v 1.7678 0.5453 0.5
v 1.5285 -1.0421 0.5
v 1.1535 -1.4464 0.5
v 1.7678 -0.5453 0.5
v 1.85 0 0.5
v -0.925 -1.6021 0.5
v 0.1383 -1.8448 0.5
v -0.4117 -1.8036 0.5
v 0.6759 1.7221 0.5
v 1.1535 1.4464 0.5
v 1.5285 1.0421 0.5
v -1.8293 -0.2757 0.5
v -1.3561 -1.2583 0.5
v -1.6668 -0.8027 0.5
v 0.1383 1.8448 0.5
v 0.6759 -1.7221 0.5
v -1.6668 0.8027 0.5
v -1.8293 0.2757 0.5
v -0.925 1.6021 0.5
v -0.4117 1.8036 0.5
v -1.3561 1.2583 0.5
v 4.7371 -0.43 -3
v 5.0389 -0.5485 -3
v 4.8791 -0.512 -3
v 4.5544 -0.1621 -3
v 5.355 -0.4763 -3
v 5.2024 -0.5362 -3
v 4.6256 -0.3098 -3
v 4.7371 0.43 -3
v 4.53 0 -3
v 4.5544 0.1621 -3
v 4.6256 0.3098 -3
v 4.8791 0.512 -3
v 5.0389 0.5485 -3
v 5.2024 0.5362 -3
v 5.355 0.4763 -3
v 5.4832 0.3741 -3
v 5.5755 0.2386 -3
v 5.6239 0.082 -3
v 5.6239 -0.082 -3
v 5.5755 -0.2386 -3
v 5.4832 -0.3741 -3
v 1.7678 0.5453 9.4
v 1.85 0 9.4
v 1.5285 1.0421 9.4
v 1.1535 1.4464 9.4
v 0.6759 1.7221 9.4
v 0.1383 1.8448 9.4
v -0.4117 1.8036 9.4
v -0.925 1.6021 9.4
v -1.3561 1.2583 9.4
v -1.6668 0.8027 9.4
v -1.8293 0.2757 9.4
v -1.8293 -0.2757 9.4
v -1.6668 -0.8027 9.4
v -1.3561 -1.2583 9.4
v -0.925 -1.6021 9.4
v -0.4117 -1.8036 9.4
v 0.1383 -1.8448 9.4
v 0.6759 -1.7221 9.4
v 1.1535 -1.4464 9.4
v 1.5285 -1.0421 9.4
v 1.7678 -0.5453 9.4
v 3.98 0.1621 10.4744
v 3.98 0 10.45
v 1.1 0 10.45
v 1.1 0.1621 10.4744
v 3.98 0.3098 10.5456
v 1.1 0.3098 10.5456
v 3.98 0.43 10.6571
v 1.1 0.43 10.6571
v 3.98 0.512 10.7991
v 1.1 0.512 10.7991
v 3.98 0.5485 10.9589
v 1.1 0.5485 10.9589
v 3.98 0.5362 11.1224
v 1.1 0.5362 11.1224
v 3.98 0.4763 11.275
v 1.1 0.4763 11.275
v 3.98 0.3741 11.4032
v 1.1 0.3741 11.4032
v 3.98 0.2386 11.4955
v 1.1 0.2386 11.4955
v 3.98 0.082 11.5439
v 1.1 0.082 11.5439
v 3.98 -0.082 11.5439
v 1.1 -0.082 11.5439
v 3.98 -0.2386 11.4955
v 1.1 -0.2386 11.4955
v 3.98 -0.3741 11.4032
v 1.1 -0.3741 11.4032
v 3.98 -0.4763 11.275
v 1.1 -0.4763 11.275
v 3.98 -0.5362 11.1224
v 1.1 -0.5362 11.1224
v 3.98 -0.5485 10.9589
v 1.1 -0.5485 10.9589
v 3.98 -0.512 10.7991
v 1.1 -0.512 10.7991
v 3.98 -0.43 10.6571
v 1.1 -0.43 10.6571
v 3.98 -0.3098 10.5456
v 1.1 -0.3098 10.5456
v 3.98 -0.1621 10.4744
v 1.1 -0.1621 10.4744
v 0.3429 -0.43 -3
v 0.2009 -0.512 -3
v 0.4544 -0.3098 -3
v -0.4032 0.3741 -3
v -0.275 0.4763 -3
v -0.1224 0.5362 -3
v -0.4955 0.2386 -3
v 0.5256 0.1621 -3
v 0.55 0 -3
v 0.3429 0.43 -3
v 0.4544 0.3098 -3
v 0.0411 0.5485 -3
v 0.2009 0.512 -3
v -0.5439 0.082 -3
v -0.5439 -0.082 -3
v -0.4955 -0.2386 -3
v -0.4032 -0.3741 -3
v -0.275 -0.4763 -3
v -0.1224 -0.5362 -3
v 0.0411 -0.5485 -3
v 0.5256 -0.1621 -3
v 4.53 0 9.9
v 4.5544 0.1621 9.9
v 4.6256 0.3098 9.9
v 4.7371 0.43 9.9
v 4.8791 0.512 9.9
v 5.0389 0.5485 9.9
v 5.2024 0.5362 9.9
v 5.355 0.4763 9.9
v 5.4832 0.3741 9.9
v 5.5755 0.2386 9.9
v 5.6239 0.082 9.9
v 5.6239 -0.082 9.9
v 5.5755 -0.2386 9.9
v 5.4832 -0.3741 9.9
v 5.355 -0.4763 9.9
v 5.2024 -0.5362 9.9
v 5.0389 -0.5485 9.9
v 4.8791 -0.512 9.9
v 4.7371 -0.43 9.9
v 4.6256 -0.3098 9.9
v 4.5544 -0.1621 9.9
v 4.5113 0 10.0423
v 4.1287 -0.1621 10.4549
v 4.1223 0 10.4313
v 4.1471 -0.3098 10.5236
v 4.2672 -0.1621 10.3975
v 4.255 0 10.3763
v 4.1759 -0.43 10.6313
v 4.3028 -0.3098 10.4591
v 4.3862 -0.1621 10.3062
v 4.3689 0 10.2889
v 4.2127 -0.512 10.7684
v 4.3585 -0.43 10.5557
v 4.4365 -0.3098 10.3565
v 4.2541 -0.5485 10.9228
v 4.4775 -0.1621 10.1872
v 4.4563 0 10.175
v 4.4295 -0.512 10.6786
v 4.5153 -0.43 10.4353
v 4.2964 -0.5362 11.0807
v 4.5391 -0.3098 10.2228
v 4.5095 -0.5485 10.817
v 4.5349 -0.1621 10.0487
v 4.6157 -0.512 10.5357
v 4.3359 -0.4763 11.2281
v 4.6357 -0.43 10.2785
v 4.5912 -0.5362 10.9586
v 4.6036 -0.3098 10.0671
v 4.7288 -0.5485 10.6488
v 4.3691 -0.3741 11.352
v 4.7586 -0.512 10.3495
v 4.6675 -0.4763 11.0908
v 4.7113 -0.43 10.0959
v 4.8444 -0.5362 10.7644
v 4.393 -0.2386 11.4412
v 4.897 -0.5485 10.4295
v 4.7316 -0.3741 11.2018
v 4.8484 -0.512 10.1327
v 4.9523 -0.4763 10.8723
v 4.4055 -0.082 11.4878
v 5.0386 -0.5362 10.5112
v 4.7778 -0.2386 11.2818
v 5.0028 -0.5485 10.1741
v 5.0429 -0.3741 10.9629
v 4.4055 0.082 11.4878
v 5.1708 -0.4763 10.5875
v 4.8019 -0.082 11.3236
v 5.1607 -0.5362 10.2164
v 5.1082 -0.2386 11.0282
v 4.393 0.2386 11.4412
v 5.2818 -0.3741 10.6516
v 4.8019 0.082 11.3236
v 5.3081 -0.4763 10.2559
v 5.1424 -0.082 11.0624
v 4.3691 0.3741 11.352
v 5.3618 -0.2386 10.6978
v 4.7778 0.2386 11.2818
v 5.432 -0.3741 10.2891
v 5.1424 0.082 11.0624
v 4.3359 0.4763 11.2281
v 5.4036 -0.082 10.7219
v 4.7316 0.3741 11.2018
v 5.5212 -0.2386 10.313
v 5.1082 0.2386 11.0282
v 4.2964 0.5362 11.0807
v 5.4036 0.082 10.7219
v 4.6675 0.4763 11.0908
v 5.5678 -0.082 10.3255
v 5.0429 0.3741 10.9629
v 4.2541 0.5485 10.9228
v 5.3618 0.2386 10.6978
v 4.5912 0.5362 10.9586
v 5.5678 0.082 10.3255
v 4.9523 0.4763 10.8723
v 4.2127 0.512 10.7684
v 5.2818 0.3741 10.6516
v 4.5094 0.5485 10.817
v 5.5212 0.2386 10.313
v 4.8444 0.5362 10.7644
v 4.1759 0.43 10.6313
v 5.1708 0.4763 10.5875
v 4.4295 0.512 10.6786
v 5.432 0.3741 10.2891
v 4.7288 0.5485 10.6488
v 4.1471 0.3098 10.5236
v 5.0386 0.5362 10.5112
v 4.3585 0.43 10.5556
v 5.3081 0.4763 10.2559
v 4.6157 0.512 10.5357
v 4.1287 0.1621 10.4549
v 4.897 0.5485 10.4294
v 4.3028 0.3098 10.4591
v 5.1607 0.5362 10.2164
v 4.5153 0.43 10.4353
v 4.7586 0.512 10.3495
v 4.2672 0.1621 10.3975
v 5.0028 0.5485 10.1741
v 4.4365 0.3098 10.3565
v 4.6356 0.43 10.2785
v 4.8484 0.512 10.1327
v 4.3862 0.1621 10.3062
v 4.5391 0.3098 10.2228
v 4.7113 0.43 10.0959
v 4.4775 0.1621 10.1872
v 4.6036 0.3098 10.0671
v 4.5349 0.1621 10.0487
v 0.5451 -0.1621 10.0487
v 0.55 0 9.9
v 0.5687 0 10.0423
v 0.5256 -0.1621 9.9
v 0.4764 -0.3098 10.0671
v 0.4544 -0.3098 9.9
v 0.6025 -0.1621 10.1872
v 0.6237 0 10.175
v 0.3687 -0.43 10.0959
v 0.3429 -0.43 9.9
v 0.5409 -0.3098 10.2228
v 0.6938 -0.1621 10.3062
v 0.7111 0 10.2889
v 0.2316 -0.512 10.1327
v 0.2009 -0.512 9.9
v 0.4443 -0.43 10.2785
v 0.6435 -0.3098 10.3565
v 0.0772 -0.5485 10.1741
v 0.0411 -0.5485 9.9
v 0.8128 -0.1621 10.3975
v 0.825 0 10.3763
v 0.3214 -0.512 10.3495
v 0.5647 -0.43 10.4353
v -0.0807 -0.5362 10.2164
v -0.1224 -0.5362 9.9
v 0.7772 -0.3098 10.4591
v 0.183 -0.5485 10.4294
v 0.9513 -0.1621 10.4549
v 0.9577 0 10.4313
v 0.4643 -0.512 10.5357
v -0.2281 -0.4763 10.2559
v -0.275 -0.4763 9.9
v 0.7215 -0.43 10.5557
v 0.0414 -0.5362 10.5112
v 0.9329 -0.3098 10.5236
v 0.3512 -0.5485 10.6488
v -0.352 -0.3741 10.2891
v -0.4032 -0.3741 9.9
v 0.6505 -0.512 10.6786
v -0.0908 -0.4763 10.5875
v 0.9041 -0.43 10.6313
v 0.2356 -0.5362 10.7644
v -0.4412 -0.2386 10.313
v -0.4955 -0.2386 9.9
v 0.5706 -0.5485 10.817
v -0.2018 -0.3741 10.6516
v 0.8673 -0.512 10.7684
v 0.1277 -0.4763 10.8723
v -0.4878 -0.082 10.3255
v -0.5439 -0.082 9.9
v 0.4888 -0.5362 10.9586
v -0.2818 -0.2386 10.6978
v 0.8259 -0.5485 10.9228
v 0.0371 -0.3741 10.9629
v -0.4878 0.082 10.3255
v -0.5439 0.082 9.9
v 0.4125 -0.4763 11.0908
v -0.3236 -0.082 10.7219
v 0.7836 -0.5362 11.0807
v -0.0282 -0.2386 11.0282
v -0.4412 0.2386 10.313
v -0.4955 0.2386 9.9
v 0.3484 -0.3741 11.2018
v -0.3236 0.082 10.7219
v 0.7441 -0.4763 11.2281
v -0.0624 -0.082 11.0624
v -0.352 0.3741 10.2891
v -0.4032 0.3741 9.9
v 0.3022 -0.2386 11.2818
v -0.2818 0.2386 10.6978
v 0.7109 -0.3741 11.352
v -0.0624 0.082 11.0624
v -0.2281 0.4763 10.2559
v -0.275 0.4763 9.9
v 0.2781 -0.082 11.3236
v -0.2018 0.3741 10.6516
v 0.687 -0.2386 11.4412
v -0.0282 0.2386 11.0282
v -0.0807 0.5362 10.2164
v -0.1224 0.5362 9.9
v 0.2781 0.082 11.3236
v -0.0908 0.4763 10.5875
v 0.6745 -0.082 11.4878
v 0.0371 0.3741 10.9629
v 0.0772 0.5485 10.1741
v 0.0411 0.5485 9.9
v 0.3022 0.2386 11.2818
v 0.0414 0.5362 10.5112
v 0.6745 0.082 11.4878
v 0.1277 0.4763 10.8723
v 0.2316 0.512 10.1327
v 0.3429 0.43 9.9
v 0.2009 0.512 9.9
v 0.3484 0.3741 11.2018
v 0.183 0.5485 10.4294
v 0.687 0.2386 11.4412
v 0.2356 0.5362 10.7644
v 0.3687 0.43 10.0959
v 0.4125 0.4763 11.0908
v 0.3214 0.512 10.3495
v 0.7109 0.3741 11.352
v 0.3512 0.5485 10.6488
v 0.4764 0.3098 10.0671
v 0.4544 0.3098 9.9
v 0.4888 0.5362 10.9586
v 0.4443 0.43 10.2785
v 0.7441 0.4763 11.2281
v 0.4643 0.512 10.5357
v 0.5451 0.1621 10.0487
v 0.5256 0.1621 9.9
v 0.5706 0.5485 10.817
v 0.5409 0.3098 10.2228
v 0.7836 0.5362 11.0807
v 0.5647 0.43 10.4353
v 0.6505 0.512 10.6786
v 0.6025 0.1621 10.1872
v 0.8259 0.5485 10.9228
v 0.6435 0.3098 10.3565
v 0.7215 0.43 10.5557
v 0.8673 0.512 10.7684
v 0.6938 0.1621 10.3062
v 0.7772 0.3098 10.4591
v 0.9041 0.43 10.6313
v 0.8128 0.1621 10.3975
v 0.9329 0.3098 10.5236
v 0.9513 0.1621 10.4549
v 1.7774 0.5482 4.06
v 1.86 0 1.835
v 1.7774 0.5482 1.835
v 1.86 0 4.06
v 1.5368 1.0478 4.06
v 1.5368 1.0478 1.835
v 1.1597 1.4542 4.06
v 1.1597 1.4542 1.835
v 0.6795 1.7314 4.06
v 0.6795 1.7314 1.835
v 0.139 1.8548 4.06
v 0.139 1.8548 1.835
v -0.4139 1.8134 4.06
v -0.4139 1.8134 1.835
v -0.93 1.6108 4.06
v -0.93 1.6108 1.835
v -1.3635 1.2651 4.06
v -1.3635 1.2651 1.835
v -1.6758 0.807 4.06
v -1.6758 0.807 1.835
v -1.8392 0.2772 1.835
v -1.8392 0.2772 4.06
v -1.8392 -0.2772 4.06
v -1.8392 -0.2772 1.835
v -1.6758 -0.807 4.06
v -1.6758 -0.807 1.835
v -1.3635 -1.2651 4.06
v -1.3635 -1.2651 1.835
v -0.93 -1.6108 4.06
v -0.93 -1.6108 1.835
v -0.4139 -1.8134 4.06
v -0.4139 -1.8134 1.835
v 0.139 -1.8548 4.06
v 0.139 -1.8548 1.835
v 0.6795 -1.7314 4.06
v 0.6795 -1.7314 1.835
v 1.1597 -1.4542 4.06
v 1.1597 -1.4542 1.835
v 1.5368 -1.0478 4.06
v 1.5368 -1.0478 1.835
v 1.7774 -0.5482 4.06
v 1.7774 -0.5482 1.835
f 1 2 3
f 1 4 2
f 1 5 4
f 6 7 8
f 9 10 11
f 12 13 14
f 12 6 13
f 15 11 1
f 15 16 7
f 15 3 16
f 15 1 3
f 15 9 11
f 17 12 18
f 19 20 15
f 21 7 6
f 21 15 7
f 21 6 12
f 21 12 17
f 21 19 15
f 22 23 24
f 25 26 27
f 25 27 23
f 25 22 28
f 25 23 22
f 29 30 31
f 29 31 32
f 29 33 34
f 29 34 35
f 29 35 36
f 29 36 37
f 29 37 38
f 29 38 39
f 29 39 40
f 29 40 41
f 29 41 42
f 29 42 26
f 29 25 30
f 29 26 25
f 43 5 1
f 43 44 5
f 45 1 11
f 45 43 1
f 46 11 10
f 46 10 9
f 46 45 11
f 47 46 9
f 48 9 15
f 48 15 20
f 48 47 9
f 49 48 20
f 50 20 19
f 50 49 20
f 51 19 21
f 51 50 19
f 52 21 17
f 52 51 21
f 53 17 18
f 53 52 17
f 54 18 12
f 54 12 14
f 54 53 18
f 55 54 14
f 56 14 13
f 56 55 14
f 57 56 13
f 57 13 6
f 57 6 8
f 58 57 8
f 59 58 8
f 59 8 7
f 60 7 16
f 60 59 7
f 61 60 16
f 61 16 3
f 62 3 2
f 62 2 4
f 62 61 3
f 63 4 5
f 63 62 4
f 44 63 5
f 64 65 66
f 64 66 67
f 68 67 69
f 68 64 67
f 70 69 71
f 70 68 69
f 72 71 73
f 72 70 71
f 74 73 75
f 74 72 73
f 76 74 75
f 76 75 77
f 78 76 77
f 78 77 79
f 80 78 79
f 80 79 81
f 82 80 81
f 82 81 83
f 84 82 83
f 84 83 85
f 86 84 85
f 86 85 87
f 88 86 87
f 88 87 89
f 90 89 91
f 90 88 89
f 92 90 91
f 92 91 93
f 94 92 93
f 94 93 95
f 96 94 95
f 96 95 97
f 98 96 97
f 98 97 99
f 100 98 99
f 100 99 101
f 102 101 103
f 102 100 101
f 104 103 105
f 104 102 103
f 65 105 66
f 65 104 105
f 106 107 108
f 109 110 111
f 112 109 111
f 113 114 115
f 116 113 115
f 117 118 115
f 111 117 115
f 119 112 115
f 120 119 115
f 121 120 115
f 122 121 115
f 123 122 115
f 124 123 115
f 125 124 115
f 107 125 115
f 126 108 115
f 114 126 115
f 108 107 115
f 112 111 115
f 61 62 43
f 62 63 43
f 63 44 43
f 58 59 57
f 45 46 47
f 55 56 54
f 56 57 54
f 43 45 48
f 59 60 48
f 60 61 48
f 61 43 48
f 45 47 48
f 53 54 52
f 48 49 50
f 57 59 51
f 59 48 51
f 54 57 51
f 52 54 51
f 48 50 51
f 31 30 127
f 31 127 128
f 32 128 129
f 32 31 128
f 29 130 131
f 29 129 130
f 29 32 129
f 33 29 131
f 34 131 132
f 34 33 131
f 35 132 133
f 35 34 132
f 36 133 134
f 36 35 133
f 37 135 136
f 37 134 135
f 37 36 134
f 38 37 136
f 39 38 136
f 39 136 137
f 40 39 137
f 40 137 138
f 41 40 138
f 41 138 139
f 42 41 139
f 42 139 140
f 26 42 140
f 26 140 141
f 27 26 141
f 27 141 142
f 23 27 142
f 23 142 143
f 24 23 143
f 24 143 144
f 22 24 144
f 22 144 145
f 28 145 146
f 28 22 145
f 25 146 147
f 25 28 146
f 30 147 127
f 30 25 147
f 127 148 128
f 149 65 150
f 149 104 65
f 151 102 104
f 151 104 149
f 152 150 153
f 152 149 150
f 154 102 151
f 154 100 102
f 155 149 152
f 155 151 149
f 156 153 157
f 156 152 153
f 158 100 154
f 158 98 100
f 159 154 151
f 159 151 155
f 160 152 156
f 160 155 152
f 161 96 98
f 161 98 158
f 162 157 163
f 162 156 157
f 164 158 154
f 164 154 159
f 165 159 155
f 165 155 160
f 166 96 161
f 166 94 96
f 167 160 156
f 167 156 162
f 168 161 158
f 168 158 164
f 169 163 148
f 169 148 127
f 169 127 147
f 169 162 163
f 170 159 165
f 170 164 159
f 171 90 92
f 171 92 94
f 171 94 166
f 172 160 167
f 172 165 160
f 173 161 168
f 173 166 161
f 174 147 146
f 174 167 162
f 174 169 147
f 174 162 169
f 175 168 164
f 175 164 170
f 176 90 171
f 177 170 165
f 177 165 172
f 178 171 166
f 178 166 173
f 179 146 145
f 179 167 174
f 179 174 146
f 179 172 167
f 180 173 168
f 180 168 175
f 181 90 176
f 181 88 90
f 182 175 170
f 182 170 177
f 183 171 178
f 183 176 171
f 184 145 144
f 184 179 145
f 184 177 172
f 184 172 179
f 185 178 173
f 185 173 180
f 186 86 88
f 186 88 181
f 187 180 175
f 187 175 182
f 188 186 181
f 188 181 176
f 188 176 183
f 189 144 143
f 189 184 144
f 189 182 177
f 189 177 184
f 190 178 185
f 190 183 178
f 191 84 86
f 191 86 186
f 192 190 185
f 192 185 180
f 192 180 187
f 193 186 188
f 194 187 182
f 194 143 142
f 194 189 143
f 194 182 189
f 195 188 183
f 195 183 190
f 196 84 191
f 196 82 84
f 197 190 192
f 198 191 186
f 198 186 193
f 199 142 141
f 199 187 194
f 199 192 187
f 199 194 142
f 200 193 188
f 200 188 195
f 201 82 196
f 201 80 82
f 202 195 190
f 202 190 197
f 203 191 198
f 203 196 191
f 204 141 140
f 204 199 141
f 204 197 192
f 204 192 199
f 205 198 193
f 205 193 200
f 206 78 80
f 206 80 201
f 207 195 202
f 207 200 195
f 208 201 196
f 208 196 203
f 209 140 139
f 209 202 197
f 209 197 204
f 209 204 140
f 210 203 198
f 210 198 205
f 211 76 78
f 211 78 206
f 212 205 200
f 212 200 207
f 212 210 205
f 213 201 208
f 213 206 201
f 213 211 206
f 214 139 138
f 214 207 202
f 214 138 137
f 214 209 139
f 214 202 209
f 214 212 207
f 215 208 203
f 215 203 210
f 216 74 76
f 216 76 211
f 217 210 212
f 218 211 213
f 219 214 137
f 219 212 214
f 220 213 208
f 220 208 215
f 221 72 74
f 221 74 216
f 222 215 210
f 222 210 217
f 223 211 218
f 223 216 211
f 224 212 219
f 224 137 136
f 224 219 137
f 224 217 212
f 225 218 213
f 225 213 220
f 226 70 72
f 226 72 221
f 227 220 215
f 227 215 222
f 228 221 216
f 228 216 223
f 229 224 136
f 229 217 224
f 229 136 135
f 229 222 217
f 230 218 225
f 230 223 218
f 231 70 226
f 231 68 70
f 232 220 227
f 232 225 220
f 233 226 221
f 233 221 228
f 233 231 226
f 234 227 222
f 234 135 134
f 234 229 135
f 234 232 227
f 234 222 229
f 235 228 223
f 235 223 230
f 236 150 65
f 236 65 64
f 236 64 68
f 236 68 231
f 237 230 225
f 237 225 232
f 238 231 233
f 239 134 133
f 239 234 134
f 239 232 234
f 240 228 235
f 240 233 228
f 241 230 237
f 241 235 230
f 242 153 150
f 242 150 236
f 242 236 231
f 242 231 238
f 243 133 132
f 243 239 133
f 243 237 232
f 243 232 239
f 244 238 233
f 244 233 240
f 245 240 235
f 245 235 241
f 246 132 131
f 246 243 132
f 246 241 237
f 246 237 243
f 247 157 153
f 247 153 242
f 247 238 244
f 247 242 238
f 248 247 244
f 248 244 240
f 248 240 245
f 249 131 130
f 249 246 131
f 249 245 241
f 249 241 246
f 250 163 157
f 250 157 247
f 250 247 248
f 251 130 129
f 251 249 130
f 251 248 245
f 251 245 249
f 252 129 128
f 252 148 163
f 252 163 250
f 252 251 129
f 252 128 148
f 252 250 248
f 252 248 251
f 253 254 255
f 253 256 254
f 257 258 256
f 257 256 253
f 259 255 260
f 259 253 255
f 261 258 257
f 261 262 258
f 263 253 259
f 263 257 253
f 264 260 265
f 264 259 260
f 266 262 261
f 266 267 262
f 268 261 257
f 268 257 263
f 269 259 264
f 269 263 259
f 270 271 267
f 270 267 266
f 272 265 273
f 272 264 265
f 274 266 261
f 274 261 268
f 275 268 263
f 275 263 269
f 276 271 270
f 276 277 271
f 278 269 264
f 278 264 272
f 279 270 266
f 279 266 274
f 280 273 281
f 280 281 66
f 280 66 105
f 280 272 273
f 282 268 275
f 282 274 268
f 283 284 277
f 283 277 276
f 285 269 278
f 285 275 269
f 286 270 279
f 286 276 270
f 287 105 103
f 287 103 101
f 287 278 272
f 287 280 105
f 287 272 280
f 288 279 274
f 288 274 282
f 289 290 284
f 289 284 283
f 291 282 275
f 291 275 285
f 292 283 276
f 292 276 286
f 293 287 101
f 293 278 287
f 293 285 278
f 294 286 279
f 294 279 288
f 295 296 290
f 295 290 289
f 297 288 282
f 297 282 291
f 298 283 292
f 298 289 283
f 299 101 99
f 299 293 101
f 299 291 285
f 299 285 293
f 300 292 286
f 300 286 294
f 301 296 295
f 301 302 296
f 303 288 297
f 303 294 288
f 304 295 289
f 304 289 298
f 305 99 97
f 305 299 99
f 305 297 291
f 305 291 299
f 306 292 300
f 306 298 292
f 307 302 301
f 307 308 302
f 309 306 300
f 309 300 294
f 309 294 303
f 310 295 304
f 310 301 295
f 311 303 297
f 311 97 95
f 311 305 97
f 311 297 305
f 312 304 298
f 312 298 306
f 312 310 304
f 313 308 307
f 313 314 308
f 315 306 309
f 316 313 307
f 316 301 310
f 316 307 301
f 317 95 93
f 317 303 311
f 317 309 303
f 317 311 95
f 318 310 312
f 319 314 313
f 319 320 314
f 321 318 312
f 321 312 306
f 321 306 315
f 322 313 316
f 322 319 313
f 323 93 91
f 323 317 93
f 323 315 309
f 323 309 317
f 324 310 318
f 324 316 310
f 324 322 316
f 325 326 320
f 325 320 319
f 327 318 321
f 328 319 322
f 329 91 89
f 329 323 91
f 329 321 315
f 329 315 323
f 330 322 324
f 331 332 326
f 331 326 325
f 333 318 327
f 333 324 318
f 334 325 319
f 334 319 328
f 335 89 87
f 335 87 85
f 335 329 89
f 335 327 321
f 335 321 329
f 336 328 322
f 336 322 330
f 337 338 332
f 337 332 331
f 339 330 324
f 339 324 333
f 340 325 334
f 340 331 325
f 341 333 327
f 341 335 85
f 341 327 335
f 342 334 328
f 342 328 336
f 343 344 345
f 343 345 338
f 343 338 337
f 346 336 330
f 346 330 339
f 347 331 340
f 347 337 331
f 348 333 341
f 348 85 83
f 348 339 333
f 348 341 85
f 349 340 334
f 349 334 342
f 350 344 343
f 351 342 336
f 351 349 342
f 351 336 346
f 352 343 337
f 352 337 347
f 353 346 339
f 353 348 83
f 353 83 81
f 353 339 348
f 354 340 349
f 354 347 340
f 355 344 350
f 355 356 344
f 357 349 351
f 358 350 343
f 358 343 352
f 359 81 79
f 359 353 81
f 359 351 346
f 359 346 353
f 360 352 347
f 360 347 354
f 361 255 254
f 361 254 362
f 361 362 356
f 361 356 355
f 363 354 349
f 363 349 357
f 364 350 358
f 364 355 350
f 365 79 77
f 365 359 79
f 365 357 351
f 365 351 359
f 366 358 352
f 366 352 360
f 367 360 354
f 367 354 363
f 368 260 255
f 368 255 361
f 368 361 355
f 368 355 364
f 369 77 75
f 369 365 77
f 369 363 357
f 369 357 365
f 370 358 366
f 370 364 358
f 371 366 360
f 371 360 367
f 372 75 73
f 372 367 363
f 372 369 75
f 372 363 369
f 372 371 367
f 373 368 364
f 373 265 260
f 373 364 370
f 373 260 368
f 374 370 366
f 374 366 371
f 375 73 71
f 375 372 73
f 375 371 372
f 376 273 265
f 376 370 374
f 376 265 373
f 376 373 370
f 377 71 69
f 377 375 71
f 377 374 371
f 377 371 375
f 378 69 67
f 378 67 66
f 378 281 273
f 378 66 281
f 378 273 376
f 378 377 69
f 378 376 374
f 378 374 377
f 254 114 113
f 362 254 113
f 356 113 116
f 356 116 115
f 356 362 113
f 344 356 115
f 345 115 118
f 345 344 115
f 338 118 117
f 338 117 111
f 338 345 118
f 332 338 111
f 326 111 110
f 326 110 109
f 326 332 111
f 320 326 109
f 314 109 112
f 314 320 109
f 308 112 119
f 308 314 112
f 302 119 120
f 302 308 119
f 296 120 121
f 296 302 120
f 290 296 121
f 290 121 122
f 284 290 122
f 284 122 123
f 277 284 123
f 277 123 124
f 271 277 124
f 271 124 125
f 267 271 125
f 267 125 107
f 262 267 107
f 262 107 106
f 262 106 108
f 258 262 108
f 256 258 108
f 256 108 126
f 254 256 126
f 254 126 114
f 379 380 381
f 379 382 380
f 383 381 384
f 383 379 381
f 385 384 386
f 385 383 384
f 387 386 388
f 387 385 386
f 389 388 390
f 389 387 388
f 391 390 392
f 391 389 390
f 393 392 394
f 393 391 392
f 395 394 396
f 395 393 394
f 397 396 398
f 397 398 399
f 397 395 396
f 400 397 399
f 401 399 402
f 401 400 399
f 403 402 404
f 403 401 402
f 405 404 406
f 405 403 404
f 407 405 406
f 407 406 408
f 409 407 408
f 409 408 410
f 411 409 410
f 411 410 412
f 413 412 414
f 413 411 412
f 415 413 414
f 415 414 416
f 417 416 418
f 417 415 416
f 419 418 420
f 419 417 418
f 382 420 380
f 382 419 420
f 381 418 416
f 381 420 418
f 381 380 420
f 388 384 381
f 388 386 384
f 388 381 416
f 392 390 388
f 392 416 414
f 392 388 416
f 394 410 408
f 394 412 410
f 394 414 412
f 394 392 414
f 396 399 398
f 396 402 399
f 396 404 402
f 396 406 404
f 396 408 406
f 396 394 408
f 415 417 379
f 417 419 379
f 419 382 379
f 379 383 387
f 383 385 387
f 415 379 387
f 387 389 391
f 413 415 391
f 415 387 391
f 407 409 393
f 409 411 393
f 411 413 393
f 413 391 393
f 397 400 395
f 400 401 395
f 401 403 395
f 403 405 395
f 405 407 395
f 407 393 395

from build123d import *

# Parameters (mm, degrees)
SKETCH001_R = 0.55
SKETCH002_W = 1.85
SKETCH002_H = 8.9
SKETCH003_W = 1.86
SKETCH003_H = 2.225


with BuildPart() as sweep_body:
    # Sweep: sweep along a path in Sketch
    with BuildLine(Plane.XZ) as sweep_path:
        Line((0, -3), (0, 9.9))
        ThreePointArc((0, 9.9), (0.322183, 10.677817), (1.1, 11))
        Line((1.1, 11), (3.98, 11))
        ThreePointArc((3.98, 11), (4.757817, 10.677817), (5.08, 9.9))
        Line((5.08, 9.9), (5.08, -3))
    # Sketch001 → Sweep (sweep)
    with BuildSketch(Plane.XY):
        Circle(SKETCH001_R)
    sweep(path=sweep_path.line)


with BuildPart() as revolution:
    # Sketch002 → Revolution (revolve)
    with BuildSketch(Plane.XZ):
        with Locations((0.925, 4.95)):
            Rectangle(SKETCH002_W, SKETCH002_H)
    revolve(axis=Axis((0, 0, 0.5), (0, 0, 1)))


with BuildPart() as revolution001:
    # Sketch003 → Revolution001 (revolve)
    with BuildSketch(Plane.XZ):
        with Locations((0.93, 2.9475)):
            Rectangle(SKETCH003_W, SKETCH003_H)
    revolve(axis=Axis((0, 0, 0), (0, 0, 1)))


solid = Compound([sweep_body.part, revolution.part, revolution001.part])
